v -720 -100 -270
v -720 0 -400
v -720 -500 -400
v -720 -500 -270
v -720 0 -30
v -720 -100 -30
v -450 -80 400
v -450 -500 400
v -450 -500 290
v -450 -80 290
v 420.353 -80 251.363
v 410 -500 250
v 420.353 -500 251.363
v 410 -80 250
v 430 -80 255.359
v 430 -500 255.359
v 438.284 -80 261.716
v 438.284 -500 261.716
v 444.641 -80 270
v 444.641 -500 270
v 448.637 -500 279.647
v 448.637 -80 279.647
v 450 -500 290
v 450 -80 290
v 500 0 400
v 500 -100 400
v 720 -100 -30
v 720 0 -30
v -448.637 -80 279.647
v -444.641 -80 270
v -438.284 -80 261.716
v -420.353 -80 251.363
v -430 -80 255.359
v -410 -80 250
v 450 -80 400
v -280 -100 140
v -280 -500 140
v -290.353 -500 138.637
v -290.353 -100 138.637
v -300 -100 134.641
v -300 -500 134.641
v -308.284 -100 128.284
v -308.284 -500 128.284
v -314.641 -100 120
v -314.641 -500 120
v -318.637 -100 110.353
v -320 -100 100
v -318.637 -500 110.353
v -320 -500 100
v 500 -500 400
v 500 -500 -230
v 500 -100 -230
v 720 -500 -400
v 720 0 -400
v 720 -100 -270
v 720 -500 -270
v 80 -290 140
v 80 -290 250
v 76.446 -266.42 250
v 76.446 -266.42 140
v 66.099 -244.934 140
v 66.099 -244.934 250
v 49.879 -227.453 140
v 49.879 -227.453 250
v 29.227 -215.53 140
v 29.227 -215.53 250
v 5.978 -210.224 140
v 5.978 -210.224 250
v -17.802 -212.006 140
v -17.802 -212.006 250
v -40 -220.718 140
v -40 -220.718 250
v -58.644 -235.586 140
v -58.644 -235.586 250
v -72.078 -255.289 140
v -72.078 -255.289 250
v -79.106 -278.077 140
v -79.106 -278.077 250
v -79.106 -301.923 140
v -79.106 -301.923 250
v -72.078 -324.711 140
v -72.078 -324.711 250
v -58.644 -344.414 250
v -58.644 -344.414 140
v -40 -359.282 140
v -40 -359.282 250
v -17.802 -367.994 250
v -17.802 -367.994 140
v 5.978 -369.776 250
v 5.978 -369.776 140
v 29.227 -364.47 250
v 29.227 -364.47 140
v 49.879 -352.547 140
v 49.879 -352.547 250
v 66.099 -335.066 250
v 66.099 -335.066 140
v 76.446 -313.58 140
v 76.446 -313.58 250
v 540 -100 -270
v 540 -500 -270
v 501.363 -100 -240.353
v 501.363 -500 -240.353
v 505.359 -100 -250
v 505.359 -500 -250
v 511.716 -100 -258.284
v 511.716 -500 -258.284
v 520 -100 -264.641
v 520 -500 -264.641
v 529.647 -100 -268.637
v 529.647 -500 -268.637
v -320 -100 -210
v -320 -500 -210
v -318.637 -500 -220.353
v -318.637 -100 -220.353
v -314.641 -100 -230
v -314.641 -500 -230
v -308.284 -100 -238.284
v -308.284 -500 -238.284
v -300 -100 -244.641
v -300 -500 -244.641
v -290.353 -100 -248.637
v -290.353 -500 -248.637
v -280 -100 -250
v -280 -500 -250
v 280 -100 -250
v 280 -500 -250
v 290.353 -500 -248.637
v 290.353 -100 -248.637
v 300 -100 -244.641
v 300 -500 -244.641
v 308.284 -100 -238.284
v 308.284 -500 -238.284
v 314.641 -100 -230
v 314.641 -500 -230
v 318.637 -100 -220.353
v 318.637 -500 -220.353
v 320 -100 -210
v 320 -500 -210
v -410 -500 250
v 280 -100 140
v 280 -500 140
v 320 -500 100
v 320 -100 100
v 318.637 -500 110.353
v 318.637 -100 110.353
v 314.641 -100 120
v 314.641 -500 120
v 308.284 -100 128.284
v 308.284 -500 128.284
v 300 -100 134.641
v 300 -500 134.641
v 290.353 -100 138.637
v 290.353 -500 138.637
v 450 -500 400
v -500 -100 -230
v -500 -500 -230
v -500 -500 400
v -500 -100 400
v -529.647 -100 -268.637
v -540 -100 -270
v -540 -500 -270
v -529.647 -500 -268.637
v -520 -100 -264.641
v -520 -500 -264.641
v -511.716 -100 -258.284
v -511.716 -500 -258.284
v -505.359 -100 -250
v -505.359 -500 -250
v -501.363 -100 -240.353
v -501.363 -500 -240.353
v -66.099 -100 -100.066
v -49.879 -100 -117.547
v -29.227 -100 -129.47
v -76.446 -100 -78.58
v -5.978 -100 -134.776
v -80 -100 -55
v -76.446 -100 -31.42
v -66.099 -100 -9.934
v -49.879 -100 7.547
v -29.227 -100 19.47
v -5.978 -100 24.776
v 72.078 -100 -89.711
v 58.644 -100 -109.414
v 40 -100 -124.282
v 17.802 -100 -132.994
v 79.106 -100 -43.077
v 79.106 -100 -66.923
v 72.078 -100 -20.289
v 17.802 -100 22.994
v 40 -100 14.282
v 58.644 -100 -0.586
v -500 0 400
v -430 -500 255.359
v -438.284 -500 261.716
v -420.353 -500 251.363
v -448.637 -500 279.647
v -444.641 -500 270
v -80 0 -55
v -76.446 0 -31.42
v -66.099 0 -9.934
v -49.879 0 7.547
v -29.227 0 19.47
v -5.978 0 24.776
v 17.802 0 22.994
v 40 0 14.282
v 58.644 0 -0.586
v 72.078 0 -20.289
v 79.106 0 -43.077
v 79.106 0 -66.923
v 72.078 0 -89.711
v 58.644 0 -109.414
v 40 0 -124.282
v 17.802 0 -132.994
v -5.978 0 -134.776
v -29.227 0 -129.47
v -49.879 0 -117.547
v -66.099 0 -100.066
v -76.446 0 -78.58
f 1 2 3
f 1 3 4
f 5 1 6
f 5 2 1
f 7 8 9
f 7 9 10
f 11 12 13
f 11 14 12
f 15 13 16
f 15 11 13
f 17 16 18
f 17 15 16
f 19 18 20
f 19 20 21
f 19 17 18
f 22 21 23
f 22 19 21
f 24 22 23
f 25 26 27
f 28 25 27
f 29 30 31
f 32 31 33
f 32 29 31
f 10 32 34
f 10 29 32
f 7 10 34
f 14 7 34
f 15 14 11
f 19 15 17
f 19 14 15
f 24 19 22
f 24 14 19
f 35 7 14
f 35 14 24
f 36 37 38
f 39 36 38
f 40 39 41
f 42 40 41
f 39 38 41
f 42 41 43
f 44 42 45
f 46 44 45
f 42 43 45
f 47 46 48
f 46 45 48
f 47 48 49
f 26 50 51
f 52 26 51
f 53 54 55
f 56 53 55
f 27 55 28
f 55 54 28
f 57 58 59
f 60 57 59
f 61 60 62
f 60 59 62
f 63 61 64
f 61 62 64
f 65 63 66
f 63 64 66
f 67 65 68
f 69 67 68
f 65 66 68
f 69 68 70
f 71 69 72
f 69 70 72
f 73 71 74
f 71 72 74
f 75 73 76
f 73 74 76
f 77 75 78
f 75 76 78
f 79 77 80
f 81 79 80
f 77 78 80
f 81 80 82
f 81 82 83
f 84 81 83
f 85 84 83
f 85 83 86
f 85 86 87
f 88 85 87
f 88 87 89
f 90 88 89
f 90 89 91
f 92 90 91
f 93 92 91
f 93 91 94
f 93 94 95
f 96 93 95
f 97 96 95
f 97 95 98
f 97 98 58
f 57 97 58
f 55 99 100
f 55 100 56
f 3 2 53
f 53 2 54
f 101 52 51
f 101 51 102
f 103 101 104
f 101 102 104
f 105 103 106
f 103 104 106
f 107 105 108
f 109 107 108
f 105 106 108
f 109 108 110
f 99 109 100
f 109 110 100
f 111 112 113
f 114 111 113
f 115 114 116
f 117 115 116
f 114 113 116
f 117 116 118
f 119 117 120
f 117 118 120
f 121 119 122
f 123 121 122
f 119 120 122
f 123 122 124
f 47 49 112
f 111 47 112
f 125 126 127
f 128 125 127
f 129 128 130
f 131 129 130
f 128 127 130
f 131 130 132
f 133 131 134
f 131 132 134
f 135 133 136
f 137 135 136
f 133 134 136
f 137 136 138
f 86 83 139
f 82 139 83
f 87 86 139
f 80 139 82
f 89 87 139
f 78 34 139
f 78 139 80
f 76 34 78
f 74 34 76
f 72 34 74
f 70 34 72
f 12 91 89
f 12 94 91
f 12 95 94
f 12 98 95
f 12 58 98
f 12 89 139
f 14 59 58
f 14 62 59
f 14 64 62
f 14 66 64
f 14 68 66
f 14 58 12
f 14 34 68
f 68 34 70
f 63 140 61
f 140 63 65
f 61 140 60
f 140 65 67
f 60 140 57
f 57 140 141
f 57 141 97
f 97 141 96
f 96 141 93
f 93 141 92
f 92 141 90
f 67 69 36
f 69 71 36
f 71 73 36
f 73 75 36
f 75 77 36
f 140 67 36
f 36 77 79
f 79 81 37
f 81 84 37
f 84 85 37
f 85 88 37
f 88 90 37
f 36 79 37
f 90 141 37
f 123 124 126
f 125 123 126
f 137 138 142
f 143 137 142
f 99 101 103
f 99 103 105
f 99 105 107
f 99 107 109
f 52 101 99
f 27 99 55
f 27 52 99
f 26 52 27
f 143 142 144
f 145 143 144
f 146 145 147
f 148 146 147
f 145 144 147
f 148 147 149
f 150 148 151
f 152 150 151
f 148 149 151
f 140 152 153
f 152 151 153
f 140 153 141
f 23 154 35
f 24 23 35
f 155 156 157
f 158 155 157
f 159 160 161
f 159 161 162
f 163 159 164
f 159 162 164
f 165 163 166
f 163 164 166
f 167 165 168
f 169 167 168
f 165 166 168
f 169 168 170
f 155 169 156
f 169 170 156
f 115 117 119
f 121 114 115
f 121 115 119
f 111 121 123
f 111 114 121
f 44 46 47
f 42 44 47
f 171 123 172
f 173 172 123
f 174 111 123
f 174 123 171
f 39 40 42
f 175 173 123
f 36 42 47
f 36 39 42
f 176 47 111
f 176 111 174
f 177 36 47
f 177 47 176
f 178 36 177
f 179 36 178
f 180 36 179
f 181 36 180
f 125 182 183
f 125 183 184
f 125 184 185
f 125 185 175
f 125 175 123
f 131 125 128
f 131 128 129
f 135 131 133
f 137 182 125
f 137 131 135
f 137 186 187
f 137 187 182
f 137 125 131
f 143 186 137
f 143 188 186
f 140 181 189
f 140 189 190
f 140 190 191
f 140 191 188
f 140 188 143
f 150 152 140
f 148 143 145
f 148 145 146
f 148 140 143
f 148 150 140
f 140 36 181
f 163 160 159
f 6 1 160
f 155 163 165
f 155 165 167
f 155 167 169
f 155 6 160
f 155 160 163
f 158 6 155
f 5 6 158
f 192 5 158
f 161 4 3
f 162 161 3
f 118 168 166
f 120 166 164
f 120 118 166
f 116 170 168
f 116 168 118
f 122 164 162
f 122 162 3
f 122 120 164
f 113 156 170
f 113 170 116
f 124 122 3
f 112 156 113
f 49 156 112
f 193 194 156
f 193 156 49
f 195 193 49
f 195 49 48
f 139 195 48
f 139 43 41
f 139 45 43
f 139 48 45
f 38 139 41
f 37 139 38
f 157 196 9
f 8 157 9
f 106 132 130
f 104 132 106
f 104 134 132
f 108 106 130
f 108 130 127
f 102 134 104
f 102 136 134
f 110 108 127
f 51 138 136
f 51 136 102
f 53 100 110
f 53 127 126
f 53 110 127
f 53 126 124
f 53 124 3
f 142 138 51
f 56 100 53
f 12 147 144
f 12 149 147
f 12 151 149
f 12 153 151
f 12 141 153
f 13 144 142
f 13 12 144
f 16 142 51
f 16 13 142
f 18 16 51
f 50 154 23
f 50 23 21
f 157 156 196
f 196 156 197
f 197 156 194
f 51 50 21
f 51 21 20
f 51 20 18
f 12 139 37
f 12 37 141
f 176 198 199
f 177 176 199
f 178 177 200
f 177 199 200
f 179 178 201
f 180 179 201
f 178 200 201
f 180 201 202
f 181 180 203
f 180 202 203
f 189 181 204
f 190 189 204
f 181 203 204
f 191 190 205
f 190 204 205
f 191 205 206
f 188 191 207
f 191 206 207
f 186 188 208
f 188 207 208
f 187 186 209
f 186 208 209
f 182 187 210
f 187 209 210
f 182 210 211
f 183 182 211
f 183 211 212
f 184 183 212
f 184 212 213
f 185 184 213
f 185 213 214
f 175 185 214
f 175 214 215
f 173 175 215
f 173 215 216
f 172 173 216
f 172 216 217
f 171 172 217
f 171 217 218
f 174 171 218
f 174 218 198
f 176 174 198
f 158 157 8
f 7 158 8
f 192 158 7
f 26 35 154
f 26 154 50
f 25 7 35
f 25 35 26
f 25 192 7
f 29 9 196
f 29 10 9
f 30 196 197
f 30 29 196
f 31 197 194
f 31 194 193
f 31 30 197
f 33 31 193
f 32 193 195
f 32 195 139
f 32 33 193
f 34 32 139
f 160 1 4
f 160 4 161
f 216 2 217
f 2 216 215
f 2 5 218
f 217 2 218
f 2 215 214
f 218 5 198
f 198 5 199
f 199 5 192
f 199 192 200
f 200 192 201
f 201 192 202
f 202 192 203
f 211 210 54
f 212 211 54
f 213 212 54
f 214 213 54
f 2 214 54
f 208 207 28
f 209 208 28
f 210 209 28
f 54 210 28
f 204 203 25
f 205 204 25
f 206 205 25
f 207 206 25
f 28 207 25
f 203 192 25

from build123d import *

# Parameters (mm, degrees)
F0_W      = 1440
F0_H      = 800
F1_DEPTH  = 500
F3_DEPTH  = 400
F5_DEPTH  = 400
F7_DEPTH  = 100.001
F9_DEPTH  = 100.001
F10_W     = 900
F10_H     = 420
F11_DEPTH = 150
F12_R     = 40
F13_R     = 80
F14_DEPTH = 150
F15_R     = 80
F16_DEPTH = 500.001


with BuildPart() as f1:
    # F0 (on Front) → F1 (new body)
    with BuildSketch(Plane.XZ):
        Rectangle(F0_W, F0_H)
    extrude(amount=F1_DEPTH)

    # F2 (on face) → F3 (cut)
    with BuildSketch(Plane.XZ.offset(500)):
        with BuildLine():
            Line((280, 140), (-280, 140))
            ThreePointArc((-280, 140), (-308.2842712475, 128.2842712475), (-320, 100))
            Line((-320, 100), (-320, -210))
            ThreePointArc((-320, -210), (-308.2842712475, -238.2842712475), (-280, -250))
            Line((-280, -250), (280, -250))
            ThreePointArc((280, -250), (308.2842712475, -238.2842712475), (320, -210))
            Line((320, -210), (320, 100))
            ThreePointArc((320, 100), (308.2842712475, 128.2842712475), (280, 140))
        make_face()
    extrude(amount=-F3_DEPTH, mode=Mode.SUBTRACT)

    # F4 (on face) → F5 (cut)
    with BuildSketch(Plane.XZ.offset(500)):
        with BuildLine():
            Line((-720, 400), (-720, -270))
            Line((-720, -270), (-540, -270))
            ThreePointArc((-540, -270), (-511.7157287525, -258.2842712475), (-500, -230))
            Line((-500, -230), (-500, 400))
            Line((-500, 400), (-720, 400))
        make_face()
        with BuildLine():
            Line((720, 400), (500, 400))
            Line((500, 400), (500, -230))
            ThreePointArc((500, -230), (511.7157287525, -258.2842712475), (540, -270))
            Line((540, -270), (720, -270))
            Line((720, -270), (720, 400))
        make_face()
    extrude(amount=-F5_DEPTH, mode=Mode.SUBTRACT)

    # F6 (on face) → F7 (cut, through all)
    with BuildSketch(Plane.XZ.offset(100)):
        Polygon((500, 400), (720, -30), (720, 400), align=None)
    extrude(amount=-F7_DEPTH, mode=Mode.SUBTRACT)

    # F8 (on face) → F9 (cut, through all)
    with BuildSketch(Plane.XZ.offset(100)):
        Polygon((-720, 400), (-720, -30), (-500, 400), align=None)
    extrude(amount=-F9_DEPTH, mode=Mode.SUBTRACT)

    # F10 (on face) → F11 (cut)
    with BuildSketch(Plane.XY.offset(400)):
        with Locations((0, -290)):
            Rectangle(F10_W, F10_H)
    extrude(amount=-F11_DEPTH, mode=Mode.SUBTRACT)

    # F12
    f12_edges = [f1.edges().sort_by_distance(p)[0] for p in [
        (-450, -290, 250),
        (450, -290, 250),
    ]]
    fillet(f12_edges, radius=F12_R)

    # F13 (on face) → F14 (cut)
    with BuildSketch(Plane.XY.offset(250)):
        with Locations((0, -290)):
            Circle(F13_R)
    extrude(amount=-F14_DEPTH, mode=Mode.SUBTRACT)

    # F15 (on face) → F16 (cut, through all)
    with BuildSketch(Plane(origin=(0, 0, 0), x_dir=(-1, 0, 0), z_dir=(0, 1, 0))):
        with Locations((0, -55)):
            Circle(F15_R)
    extrude(amount=-F16_DEPTH, mode=Mode.SUBTRACT)


solid = f1.part
